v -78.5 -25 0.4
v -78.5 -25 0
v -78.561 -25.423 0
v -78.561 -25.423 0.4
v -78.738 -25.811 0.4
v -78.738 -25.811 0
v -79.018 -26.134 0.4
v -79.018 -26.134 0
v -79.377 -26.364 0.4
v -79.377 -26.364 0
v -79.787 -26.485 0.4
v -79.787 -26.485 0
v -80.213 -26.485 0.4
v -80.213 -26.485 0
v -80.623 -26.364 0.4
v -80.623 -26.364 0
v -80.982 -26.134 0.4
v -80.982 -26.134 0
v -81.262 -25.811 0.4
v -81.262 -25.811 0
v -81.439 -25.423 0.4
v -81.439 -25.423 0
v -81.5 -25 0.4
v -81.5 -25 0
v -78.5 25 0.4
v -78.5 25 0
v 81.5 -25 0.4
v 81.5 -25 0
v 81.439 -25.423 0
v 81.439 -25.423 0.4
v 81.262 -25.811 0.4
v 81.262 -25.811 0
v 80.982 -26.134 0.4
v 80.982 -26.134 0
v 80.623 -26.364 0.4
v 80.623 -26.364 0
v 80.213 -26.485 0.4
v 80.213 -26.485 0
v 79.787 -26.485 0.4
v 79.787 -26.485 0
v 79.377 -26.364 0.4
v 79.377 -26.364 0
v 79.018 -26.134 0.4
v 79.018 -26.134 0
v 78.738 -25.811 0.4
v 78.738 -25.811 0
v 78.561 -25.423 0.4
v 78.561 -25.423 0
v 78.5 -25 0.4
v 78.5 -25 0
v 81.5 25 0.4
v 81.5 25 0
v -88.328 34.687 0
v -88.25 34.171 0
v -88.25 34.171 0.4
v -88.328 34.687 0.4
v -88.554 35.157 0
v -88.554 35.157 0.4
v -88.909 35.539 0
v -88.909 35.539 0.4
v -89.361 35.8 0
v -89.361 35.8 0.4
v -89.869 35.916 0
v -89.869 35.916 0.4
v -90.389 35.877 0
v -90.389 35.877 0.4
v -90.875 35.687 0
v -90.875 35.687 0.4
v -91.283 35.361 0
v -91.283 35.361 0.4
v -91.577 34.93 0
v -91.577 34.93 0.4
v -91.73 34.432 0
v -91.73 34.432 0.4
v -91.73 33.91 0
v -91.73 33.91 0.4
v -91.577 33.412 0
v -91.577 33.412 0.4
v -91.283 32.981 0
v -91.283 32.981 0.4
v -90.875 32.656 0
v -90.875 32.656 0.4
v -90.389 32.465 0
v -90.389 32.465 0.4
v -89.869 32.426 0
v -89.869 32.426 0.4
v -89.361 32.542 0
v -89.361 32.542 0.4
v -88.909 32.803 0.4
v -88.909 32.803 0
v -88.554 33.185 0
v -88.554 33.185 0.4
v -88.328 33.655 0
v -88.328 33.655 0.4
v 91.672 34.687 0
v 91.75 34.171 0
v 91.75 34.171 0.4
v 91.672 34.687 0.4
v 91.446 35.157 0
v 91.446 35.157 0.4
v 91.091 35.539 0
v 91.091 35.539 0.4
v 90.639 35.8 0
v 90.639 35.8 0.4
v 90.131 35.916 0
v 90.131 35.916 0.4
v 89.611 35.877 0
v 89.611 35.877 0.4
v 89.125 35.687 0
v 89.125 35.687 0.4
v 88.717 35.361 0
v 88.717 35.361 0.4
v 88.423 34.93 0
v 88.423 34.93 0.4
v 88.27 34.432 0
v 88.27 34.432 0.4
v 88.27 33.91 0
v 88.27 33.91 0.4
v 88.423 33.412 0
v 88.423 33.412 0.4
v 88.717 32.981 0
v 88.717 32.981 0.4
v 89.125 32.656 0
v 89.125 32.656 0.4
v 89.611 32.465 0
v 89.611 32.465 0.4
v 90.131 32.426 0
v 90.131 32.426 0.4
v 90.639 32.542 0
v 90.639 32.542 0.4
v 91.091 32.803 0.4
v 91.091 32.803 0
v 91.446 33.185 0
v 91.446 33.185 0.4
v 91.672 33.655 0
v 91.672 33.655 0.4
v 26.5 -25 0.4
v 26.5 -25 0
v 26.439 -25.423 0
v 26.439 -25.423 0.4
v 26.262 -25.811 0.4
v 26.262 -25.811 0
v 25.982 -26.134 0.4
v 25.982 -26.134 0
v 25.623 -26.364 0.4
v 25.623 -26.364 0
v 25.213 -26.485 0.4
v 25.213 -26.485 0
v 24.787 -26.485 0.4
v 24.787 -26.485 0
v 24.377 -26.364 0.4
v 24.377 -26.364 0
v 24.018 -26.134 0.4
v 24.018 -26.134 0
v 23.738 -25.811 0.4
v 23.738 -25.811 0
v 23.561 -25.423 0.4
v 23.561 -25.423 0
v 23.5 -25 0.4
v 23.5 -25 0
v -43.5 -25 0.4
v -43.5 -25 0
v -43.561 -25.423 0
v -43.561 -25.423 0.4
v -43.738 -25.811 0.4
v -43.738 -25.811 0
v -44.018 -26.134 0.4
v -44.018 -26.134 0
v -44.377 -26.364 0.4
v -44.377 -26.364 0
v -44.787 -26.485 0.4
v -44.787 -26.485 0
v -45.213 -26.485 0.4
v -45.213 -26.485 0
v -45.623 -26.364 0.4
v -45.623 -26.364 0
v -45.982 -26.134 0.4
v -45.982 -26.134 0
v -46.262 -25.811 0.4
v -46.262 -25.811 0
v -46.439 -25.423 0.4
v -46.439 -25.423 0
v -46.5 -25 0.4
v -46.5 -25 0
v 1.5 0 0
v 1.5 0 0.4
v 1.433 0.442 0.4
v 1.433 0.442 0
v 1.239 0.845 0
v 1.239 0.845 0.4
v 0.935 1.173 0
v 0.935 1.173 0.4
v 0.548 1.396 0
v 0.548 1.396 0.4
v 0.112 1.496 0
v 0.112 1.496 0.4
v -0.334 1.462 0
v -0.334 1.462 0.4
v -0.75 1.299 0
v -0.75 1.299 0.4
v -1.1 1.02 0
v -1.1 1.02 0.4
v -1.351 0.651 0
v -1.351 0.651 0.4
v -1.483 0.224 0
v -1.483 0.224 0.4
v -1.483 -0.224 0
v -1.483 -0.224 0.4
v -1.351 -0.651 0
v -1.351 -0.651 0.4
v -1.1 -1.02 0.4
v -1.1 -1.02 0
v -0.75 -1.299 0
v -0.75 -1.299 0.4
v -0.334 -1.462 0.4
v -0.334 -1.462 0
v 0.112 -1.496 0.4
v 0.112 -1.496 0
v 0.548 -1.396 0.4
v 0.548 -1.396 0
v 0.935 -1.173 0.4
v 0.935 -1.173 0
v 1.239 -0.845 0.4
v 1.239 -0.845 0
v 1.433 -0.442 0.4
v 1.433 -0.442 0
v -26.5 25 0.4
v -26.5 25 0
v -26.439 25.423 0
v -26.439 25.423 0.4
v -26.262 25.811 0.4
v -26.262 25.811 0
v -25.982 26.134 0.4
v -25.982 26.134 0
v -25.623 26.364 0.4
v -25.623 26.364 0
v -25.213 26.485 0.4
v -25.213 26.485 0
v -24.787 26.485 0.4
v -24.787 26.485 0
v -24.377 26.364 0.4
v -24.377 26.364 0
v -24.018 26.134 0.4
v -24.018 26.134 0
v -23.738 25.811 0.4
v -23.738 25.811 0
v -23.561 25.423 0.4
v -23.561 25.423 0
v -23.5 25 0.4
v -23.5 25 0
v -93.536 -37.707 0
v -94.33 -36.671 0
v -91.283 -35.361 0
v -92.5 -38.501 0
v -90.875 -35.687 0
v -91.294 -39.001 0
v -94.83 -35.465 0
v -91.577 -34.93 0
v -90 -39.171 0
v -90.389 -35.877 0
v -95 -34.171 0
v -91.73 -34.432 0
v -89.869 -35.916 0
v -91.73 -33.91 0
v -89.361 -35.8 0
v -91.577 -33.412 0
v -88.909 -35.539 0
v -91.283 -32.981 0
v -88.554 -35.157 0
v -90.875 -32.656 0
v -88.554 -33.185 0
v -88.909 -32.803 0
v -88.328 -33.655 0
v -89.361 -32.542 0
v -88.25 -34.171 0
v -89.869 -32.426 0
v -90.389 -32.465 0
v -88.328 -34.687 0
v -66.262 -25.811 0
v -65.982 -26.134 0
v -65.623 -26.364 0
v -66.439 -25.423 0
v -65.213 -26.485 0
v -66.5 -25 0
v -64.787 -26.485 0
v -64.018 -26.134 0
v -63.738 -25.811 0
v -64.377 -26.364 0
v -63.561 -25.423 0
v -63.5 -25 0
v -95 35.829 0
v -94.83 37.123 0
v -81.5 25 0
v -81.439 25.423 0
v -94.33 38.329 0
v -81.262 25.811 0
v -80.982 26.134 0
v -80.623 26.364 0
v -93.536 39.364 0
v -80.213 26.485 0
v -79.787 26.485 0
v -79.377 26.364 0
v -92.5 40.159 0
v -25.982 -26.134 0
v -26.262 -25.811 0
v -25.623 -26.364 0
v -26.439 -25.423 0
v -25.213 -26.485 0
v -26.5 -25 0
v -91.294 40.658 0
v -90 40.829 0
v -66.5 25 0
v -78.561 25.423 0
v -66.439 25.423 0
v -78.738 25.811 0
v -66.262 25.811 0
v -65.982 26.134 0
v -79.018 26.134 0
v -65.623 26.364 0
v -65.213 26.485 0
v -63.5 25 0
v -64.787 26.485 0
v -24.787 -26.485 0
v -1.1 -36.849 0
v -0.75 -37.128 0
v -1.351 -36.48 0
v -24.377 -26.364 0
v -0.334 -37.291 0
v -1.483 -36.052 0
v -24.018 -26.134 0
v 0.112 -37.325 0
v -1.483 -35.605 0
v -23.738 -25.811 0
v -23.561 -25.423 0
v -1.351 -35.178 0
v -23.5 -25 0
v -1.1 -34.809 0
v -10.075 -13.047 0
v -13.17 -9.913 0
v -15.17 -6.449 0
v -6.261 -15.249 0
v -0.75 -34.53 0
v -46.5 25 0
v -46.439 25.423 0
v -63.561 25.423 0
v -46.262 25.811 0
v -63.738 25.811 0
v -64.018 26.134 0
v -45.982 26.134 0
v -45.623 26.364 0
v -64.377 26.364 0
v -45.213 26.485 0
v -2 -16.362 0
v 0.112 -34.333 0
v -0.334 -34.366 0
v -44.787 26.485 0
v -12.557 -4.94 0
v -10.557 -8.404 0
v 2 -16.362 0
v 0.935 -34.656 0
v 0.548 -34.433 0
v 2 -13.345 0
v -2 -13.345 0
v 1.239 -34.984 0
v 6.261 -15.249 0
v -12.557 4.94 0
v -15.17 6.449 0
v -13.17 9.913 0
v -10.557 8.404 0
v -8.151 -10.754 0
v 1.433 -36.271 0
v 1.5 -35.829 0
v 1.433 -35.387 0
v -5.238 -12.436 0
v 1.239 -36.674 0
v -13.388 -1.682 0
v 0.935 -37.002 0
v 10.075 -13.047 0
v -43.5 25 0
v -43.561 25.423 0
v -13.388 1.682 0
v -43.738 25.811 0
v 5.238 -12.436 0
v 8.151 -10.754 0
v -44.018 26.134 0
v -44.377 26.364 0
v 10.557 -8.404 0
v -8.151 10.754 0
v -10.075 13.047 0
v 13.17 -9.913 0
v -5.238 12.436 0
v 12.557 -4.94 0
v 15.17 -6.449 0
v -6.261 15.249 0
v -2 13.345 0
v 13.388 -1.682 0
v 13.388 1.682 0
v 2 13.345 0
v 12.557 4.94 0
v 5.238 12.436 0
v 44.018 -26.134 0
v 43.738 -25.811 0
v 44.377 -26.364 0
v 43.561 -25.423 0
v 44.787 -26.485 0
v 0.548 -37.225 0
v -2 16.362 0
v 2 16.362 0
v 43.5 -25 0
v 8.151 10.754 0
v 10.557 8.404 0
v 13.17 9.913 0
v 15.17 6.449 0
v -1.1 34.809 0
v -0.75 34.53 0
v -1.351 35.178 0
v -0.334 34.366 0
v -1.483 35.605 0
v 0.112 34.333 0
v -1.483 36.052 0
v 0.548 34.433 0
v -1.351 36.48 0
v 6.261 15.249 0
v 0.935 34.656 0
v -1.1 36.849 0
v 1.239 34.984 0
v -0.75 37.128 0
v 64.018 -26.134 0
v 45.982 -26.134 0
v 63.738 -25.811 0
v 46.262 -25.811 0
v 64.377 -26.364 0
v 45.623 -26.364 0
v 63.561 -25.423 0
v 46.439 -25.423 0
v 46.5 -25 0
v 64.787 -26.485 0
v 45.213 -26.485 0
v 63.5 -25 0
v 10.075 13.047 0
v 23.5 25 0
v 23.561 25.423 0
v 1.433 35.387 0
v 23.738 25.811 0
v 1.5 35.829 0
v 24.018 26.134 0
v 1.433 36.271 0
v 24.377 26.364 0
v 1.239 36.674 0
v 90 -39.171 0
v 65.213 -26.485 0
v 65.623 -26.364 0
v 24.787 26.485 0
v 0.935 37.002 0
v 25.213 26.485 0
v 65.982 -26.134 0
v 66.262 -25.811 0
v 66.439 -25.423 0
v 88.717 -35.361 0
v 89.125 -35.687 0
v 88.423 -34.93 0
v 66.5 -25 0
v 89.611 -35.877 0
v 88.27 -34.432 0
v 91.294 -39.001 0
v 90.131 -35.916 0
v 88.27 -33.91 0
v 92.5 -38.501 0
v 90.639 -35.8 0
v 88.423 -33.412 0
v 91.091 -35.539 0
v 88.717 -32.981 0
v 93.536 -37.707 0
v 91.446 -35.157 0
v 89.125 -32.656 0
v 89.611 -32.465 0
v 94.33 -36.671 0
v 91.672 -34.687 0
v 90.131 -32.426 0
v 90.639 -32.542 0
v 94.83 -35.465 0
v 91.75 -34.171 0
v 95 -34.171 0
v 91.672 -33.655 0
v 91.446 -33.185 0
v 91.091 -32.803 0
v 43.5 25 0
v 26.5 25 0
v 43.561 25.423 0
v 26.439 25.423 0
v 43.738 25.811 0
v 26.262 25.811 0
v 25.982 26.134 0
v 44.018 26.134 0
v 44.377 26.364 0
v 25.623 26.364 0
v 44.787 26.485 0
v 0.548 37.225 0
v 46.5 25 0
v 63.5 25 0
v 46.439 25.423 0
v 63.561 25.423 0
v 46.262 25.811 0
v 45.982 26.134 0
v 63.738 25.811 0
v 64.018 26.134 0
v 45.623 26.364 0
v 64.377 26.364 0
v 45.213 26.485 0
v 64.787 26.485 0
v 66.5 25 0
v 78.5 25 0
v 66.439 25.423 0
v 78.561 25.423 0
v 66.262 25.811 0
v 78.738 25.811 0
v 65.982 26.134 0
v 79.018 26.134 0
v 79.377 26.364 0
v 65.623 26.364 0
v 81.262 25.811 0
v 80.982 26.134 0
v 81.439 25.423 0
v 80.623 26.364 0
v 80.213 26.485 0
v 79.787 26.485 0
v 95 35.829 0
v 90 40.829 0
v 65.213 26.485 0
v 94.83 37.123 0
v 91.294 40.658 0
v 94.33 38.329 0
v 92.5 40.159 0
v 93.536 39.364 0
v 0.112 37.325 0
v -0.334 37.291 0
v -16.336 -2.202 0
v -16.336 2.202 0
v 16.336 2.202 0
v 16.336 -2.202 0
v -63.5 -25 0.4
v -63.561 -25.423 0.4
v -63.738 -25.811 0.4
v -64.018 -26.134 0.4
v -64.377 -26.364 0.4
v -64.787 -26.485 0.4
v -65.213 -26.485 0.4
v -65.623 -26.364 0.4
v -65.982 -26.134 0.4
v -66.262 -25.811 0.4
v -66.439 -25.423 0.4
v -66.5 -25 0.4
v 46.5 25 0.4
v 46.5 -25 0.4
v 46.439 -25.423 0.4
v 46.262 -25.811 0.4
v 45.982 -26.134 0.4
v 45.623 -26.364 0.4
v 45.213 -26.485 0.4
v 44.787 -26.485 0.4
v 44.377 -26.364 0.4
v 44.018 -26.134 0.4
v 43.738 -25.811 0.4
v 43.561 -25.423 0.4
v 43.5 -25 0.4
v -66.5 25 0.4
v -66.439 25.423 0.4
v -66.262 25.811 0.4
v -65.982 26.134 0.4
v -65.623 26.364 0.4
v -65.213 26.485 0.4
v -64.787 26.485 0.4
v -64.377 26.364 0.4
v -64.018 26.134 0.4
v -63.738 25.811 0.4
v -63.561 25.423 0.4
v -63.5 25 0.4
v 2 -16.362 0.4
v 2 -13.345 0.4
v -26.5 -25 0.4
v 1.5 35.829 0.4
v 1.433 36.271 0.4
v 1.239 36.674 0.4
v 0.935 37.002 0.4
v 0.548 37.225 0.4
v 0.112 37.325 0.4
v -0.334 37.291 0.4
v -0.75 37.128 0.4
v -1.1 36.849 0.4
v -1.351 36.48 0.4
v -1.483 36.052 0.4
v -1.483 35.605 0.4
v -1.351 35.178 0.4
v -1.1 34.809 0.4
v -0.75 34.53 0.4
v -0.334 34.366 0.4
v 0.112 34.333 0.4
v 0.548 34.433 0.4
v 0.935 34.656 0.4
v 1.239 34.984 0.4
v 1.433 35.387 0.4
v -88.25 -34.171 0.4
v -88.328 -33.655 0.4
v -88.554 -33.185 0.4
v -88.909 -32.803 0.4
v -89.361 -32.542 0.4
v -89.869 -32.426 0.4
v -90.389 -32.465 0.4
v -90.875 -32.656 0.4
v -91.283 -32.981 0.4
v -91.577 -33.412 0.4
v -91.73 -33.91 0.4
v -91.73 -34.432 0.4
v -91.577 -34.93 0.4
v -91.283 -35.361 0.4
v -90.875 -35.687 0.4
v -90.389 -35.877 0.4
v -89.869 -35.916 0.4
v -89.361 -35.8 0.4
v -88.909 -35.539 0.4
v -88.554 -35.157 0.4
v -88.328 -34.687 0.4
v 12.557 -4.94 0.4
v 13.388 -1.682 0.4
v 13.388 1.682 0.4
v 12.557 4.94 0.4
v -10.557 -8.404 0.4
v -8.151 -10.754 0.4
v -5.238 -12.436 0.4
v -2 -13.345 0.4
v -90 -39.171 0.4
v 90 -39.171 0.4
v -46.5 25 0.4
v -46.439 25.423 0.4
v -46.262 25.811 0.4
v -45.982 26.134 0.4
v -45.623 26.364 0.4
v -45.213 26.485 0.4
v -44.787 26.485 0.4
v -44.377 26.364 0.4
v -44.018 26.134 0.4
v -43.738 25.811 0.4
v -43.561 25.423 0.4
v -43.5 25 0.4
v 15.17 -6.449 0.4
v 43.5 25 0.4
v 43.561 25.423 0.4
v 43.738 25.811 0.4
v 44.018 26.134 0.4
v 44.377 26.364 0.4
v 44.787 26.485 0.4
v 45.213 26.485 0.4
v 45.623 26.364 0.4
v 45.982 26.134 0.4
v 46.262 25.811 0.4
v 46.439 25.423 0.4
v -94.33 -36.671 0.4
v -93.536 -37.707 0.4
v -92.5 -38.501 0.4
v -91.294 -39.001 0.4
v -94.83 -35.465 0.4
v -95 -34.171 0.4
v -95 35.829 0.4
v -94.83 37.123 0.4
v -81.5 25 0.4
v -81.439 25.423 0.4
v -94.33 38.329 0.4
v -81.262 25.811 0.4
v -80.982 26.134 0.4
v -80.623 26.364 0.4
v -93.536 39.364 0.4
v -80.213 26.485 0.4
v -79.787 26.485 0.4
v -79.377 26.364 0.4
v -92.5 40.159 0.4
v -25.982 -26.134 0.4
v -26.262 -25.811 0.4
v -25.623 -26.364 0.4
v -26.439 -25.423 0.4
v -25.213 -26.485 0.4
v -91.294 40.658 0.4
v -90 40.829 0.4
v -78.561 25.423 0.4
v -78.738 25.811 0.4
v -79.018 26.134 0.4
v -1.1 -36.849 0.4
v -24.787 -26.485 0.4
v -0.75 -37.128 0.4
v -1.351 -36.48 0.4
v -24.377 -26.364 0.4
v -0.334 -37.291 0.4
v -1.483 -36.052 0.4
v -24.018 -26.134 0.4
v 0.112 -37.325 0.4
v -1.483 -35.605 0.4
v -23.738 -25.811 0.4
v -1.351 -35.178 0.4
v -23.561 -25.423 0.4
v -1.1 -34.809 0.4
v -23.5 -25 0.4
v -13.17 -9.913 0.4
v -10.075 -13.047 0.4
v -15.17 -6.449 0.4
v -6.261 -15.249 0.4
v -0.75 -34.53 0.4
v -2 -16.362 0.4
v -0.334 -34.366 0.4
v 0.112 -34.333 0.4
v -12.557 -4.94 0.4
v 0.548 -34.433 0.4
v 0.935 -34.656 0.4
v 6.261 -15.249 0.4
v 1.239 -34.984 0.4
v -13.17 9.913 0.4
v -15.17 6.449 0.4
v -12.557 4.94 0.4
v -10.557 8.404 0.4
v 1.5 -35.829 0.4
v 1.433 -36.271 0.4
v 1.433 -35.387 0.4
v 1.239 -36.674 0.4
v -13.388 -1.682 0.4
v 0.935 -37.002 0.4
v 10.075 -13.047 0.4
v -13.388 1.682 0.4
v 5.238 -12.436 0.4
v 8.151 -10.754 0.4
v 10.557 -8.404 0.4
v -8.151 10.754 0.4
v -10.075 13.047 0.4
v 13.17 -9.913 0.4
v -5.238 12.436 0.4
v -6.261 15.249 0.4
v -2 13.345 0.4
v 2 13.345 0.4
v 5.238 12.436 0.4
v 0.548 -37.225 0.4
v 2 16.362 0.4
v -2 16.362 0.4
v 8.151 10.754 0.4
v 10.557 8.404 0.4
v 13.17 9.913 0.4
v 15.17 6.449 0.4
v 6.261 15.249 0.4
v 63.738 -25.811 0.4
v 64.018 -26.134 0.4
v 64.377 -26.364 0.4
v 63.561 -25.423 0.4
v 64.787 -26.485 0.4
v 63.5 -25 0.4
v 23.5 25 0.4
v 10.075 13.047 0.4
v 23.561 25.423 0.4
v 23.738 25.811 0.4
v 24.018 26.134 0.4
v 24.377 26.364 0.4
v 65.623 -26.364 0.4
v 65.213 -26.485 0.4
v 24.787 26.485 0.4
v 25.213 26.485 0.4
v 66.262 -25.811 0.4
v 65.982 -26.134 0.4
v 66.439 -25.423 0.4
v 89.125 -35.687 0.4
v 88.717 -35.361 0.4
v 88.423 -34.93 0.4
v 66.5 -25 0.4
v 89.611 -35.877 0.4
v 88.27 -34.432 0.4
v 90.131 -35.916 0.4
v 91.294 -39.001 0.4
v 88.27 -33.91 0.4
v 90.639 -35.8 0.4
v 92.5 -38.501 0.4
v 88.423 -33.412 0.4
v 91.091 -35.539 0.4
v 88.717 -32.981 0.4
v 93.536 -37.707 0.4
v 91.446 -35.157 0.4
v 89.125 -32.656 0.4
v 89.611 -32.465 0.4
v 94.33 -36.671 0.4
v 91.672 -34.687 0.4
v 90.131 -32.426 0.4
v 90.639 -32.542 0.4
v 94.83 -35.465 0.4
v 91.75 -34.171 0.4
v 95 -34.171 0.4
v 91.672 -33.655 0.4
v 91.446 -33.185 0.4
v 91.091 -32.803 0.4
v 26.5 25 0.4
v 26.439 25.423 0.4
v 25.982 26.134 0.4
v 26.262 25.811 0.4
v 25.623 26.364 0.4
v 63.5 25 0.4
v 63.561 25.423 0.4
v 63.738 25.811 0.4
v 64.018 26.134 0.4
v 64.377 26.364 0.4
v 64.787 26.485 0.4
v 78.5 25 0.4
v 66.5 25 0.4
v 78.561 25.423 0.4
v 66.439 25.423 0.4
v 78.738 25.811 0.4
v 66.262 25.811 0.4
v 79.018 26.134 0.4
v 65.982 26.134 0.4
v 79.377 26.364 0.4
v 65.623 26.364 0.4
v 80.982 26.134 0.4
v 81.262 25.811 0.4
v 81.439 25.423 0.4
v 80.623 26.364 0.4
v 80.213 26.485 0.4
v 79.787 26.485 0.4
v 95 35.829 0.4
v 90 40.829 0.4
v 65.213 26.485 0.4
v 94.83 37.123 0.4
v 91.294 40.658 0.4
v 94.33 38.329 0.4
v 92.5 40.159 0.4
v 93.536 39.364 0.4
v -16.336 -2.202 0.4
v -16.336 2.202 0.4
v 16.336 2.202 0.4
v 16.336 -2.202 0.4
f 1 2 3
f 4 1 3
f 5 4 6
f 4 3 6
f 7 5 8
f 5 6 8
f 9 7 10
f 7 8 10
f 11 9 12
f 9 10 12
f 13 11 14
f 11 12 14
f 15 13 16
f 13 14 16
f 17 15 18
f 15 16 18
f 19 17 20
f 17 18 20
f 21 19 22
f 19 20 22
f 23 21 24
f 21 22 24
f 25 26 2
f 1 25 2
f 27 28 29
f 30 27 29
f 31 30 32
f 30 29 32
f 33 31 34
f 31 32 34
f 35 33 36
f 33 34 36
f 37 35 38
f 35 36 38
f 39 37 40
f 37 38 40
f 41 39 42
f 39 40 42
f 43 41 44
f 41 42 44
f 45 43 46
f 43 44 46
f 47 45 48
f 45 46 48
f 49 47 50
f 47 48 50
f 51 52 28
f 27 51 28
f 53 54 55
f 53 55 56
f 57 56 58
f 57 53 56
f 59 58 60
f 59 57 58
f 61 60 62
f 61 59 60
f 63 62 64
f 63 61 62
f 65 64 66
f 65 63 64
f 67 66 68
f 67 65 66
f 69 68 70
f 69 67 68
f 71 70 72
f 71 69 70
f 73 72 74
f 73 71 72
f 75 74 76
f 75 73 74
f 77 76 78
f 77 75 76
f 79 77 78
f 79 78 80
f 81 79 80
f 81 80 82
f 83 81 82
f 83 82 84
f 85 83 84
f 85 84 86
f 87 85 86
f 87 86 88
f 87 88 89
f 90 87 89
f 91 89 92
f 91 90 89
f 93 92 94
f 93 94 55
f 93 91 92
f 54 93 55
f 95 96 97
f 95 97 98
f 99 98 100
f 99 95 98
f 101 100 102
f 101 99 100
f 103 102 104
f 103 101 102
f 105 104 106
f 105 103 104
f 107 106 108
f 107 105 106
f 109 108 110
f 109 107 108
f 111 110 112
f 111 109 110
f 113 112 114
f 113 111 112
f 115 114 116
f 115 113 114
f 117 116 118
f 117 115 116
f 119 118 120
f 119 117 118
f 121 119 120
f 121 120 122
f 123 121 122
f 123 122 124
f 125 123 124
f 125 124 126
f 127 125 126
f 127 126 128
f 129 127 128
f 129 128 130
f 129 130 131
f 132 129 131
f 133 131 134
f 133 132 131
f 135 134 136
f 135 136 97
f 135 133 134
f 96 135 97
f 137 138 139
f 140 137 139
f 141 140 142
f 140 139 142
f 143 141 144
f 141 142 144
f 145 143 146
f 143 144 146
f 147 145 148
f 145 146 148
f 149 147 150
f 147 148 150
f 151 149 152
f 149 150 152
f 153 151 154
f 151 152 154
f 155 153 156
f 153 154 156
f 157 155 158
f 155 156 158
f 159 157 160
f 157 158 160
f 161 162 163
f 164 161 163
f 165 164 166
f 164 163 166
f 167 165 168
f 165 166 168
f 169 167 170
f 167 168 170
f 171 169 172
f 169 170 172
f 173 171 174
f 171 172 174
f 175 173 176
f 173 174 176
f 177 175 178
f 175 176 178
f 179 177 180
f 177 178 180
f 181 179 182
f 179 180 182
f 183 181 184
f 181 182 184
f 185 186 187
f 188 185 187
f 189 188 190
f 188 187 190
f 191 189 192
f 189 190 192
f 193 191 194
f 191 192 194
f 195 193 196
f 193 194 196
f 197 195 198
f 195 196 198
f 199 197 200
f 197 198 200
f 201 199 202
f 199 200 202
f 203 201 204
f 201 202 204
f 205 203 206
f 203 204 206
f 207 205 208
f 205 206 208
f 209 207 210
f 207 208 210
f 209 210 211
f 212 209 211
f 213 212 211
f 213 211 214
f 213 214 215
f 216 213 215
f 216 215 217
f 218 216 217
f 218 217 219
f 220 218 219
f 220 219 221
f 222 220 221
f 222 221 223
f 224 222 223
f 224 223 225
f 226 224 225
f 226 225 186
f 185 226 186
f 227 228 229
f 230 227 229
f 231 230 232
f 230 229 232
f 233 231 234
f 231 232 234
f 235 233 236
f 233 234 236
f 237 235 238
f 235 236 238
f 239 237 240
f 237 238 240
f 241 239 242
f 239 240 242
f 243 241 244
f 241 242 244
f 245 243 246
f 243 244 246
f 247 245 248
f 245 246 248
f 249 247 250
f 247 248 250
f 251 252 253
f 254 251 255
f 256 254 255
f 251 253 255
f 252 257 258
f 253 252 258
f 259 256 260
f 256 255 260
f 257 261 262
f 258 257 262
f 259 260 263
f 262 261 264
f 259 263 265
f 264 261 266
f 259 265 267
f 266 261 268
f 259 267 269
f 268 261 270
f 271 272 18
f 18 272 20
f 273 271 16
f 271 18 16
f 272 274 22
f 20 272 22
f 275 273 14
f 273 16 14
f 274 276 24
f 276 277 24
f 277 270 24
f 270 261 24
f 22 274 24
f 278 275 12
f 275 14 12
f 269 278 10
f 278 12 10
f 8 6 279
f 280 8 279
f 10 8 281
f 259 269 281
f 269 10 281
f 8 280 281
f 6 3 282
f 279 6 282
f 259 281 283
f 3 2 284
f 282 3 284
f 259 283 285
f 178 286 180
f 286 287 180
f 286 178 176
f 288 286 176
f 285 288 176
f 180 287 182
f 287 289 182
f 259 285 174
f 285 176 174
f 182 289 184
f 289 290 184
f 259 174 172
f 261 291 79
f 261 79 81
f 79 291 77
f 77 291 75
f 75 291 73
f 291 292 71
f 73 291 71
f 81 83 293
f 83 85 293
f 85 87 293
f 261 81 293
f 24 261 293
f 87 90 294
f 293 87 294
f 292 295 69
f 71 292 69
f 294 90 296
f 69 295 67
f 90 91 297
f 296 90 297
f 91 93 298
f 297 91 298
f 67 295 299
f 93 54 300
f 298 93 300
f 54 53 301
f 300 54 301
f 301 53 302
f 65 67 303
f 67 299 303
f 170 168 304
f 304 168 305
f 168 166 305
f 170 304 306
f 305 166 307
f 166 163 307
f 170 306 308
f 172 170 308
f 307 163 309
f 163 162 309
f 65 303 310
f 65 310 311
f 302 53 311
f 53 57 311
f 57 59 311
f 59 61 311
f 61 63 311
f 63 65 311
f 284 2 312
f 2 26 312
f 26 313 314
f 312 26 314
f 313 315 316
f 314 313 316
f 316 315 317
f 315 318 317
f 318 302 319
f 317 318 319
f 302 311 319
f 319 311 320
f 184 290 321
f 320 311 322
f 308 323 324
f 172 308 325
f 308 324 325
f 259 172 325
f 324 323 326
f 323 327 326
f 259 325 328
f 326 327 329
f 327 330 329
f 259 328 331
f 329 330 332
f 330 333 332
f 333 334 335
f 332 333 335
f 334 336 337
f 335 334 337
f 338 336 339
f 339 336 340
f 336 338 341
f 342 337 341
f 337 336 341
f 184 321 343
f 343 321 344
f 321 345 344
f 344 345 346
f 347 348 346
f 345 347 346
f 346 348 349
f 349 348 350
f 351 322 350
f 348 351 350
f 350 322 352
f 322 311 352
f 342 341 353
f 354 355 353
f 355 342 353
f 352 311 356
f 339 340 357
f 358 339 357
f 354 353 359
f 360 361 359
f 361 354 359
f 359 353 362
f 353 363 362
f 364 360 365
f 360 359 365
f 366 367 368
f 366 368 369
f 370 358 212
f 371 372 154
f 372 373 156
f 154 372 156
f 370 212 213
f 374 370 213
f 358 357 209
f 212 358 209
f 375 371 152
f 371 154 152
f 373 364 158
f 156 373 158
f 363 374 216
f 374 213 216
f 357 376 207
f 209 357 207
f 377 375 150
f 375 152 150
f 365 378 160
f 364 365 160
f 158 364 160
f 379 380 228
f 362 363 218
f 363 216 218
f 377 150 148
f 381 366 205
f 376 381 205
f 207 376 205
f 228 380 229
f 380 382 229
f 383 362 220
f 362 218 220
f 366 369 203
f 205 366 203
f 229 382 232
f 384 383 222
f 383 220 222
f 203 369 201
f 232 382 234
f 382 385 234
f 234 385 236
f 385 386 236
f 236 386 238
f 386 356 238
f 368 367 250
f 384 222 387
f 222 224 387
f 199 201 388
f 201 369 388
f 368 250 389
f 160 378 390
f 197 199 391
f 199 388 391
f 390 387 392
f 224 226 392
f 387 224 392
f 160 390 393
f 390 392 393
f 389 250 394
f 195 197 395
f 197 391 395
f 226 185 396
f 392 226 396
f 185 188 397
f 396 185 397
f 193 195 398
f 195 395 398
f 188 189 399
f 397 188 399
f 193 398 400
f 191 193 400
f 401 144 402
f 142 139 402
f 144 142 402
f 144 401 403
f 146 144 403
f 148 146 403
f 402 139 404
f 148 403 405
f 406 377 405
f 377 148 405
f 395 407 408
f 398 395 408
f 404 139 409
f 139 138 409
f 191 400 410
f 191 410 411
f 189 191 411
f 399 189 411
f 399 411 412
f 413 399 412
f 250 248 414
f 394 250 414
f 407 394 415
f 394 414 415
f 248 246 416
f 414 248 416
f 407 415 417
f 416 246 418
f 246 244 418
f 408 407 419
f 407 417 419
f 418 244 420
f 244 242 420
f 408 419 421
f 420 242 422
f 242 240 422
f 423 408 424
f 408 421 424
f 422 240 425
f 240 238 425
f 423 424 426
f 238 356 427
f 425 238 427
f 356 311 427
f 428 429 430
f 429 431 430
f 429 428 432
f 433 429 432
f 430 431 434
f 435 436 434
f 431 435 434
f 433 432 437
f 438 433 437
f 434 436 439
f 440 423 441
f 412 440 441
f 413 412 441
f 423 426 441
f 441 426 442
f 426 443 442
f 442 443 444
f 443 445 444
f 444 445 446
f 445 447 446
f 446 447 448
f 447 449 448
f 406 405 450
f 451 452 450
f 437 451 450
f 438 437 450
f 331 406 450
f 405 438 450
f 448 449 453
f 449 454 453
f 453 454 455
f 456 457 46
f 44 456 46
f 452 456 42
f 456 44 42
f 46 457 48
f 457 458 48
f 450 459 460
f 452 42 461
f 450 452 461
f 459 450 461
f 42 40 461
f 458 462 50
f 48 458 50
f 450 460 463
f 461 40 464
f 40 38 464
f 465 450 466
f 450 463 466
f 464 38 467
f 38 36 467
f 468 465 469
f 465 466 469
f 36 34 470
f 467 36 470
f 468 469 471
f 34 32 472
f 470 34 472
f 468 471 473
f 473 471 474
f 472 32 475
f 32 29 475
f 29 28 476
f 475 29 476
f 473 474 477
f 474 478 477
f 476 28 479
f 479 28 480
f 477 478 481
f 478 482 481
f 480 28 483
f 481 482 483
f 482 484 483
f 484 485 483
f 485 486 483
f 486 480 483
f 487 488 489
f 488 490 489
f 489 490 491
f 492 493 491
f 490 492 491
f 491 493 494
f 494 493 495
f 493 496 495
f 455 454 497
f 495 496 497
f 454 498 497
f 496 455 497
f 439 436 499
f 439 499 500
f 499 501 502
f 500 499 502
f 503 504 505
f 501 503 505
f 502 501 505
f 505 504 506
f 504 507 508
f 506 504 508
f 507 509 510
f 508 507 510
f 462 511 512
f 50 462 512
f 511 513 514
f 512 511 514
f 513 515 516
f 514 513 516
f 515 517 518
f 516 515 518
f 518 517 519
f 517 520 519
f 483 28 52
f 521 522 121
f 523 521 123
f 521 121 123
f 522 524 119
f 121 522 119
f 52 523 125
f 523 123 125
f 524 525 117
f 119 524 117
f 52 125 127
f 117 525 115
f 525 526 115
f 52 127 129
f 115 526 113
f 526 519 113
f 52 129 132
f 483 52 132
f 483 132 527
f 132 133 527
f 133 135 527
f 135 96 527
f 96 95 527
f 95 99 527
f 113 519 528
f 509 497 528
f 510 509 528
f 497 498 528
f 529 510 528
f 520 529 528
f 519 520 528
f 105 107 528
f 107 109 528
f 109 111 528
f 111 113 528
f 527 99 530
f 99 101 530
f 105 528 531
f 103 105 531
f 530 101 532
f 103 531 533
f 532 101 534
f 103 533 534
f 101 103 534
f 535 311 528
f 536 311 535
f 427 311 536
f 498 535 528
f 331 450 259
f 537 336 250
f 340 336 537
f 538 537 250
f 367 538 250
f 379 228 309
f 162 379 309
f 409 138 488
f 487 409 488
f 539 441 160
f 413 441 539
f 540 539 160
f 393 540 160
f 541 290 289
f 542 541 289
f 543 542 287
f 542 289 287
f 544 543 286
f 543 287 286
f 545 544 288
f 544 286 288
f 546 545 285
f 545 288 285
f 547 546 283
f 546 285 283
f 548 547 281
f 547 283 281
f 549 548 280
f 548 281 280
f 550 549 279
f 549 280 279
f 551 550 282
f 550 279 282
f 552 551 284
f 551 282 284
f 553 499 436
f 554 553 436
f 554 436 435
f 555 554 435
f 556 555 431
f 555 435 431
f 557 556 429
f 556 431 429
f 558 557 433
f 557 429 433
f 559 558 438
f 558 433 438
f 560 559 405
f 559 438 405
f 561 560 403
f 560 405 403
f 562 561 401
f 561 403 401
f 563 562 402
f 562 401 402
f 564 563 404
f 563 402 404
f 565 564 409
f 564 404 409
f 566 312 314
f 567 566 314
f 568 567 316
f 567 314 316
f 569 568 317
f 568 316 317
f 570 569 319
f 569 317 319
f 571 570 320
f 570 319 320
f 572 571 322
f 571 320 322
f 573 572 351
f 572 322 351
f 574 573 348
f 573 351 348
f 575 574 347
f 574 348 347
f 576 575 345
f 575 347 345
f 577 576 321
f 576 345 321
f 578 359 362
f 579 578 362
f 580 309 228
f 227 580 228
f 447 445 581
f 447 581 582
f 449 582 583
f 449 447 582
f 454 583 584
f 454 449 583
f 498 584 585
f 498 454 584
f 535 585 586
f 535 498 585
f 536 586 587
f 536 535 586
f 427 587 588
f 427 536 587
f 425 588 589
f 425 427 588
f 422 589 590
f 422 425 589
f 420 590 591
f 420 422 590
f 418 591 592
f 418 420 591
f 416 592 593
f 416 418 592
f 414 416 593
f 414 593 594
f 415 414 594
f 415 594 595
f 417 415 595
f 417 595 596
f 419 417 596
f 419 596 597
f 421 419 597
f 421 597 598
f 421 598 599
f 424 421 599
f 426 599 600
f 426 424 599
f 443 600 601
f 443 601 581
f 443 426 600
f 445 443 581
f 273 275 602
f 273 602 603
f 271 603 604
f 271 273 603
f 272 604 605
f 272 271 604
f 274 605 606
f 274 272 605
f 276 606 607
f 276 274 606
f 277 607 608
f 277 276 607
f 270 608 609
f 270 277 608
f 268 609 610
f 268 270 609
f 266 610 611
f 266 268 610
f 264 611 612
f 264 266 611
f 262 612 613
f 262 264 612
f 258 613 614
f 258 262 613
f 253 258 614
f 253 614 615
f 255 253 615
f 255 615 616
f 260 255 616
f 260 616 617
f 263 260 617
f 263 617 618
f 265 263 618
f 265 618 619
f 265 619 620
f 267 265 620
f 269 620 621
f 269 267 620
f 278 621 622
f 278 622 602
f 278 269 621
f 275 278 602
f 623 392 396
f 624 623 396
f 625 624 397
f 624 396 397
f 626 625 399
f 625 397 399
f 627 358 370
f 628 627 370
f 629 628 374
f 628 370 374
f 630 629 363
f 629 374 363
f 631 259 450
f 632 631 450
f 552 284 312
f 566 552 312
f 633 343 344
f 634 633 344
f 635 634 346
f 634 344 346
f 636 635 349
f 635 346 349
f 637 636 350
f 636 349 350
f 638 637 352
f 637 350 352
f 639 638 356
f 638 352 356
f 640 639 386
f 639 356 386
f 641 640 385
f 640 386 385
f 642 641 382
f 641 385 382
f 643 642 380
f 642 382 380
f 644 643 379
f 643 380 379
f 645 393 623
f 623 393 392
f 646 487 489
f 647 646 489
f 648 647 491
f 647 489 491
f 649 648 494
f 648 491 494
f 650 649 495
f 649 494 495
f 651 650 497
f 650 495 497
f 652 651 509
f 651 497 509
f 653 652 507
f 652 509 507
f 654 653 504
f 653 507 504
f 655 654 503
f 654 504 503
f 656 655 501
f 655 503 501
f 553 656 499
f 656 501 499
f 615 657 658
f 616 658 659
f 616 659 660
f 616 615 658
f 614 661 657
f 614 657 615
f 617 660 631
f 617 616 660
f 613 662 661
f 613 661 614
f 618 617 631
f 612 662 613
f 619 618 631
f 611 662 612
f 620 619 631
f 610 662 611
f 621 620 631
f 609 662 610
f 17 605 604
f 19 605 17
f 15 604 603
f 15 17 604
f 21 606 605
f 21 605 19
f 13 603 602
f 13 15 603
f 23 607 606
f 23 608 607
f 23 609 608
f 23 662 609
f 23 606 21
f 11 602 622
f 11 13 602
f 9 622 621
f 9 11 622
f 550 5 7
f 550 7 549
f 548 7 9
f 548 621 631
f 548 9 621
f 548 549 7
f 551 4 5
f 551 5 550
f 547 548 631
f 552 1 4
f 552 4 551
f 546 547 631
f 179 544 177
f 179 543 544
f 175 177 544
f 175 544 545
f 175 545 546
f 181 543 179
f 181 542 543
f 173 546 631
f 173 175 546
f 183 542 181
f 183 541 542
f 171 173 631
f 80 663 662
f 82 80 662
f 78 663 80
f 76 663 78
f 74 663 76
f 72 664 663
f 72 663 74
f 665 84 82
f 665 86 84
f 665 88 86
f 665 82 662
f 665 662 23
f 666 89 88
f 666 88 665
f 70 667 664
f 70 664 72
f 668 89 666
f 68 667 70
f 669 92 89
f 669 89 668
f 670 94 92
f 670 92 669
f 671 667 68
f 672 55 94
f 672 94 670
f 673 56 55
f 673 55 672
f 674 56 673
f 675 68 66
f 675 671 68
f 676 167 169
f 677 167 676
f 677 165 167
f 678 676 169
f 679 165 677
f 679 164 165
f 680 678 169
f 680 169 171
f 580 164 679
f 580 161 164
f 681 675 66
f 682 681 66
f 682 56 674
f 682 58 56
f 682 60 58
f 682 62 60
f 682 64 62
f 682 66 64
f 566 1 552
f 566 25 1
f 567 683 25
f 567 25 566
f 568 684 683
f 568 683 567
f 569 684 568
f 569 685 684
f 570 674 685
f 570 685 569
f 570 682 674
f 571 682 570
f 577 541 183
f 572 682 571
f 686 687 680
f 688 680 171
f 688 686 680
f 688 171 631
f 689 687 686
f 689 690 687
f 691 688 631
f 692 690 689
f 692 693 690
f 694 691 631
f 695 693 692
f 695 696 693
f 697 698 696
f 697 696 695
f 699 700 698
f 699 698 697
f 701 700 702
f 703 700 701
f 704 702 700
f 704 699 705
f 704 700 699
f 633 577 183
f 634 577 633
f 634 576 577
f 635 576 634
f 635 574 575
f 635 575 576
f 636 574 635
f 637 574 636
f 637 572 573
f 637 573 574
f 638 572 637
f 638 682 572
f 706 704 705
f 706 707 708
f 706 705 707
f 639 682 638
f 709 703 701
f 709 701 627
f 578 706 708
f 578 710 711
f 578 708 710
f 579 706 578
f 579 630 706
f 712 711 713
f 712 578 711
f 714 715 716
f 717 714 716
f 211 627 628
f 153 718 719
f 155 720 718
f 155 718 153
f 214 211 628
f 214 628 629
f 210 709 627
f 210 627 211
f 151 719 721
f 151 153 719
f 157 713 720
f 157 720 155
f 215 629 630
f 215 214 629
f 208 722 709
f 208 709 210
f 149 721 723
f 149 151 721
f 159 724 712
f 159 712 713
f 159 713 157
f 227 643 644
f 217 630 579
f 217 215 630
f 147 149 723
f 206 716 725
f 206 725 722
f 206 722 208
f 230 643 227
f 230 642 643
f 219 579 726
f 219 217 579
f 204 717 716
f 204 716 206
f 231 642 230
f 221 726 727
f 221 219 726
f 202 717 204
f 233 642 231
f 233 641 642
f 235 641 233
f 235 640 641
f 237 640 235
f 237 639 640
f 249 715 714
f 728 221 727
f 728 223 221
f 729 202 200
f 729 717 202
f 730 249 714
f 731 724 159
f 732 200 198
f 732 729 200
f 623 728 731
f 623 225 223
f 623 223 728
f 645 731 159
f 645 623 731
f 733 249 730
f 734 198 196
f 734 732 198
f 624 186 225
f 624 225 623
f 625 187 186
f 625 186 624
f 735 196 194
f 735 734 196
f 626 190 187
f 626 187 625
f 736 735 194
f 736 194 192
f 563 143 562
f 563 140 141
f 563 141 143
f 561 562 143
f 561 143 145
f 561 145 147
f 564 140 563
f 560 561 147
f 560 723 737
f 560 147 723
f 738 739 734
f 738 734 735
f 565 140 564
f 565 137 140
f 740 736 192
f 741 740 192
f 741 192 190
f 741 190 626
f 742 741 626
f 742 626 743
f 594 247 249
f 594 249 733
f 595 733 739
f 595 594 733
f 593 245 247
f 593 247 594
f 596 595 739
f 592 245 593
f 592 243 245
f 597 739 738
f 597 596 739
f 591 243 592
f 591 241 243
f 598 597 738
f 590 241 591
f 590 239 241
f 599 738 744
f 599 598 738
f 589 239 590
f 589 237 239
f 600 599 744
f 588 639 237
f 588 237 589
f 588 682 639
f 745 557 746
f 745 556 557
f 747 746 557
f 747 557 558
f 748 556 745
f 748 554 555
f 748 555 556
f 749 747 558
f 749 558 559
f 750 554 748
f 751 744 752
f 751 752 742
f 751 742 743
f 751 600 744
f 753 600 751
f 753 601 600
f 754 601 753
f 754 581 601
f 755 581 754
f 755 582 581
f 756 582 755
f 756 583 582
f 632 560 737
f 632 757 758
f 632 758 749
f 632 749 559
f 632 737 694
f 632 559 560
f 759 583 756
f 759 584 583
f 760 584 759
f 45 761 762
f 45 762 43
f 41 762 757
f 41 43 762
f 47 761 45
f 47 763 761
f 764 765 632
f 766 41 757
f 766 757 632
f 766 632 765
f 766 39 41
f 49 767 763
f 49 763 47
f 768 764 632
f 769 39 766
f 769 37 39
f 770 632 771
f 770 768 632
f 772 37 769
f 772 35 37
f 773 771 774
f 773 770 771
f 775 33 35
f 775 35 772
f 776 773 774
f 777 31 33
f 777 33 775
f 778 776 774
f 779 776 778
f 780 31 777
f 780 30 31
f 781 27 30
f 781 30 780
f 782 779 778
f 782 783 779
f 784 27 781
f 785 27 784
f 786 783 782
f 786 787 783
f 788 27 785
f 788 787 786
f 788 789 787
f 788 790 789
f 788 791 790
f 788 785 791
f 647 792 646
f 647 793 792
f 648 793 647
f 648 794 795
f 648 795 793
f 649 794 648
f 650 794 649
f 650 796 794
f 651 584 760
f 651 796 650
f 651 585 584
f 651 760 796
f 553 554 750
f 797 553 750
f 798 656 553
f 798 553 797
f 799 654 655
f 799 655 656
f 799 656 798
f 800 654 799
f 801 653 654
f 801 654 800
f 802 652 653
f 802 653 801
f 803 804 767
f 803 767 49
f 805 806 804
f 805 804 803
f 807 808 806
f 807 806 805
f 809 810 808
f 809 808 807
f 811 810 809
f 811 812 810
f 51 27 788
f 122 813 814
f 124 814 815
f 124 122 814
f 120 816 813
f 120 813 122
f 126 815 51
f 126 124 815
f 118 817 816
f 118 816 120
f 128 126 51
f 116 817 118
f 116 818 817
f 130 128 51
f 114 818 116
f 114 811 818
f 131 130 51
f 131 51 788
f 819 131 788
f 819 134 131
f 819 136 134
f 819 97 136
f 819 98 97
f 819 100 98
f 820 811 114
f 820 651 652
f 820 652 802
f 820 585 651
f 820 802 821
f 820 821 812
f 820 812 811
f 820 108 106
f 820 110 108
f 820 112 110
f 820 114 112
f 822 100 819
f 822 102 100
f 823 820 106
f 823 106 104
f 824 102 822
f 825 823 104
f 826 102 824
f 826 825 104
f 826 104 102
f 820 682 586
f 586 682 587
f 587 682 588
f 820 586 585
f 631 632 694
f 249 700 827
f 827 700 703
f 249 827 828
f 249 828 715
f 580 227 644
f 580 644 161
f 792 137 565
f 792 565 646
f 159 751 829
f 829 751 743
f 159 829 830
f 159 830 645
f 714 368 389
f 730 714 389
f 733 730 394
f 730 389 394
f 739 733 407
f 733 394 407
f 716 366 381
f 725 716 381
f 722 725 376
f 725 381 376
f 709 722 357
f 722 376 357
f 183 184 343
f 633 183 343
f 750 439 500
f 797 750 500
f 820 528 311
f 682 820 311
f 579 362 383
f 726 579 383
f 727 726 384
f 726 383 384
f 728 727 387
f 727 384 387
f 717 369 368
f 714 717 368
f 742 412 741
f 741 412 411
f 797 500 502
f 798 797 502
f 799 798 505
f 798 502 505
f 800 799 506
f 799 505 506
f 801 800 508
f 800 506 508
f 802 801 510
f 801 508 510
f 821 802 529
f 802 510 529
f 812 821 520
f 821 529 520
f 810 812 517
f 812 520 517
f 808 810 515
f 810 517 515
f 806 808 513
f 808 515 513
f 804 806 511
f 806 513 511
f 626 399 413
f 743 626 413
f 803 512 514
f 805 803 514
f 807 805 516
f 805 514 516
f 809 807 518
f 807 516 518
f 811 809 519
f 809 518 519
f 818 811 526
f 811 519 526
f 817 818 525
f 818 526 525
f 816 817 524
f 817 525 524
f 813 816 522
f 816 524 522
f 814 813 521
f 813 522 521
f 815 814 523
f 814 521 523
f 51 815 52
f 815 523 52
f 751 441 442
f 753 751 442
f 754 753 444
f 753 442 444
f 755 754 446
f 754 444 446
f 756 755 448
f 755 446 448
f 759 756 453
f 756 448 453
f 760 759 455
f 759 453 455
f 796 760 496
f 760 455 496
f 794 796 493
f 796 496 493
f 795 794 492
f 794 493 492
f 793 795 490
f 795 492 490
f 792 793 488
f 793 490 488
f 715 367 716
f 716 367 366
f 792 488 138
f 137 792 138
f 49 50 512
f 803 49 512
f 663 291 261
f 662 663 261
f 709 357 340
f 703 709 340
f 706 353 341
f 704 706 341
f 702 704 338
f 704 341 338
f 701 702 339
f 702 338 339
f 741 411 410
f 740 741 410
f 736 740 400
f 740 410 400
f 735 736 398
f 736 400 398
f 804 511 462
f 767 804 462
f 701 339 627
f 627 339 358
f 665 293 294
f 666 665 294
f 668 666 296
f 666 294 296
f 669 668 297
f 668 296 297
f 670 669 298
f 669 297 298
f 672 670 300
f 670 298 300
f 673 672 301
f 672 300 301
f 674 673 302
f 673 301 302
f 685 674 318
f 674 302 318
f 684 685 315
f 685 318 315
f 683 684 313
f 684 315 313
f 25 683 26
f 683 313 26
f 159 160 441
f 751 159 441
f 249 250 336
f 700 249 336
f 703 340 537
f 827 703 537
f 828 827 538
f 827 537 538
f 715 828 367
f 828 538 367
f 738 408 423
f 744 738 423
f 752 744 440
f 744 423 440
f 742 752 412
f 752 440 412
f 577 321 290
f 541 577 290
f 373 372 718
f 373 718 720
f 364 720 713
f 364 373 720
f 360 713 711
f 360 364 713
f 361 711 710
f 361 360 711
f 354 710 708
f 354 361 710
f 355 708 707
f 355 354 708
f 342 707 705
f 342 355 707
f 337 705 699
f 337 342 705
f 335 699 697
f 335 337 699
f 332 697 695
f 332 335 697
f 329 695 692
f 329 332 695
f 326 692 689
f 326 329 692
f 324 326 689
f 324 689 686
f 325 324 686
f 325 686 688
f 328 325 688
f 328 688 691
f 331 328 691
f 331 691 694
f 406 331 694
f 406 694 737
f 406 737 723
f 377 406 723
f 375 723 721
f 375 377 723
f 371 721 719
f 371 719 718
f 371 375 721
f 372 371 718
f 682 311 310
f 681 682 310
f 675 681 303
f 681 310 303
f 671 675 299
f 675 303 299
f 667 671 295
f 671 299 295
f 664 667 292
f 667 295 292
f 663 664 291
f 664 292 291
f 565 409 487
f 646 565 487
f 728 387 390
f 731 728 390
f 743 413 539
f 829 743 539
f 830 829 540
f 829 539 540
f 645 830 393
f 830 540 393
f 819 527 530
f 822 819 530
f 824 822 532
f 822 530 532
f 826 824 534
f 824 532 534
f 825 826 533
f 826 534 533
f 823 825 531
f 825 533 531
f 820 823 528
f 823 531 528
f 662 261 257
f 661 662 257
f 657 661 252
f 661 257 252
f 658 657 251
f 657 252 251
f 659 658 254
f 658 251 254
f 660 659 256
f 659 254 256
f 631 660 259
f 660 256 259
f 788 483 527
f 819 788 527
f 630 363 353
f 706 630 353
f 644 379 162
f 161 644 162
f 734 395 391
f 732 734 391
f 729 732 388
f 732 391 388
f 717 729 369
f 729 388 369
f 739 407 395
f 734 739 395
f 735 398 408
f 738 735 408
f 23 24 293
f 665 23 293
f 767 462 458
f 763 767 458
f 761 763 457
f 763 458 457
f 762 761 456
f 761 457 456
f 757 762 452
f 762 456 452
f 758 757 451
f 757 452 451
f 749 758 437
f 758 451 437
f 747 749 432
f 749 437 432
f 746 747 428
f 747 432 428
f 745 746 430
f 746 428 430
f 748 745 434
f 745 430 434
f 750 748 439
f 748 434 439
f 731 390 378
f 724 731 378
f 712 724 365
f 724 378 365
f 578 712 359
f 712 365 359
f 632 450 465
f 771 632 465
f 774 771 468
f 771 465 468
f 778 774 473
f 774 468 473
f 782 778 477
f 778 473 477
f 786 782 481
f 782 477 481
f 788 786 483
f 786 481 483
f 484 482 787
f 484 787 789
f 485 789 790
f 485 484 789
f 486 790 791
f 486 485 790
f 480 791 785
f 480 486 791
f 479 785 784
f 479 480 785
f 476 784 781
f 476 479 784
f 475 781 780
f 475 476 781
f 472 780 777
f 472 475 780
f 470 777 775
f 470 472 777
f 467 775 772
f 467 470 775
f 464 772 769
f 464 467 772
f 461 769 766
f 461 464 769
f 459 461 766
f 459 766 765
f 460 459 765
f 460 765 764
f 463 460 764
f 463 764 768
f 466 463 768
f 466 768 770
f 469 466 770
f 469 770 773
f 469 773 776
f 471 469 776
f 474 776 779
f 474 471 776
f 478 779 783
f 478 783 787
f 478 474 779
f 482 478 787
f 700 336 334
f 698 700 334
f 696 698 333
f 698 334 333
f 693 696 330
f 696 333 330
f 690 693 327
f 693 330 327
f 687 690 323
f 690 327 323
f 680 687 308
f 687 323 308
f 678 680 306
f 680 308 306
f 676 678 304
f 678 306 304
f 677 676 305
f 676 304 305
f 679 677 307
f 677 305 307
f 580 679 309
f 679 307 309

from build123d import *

# Parameters (mm, degrees)
SKETCH_1_R          = 1.75
SKETCH_1_R_2        = 1.5
EXTRUDE_1_DEPTH     = 0.4
SKETCH_2_R          = 1.5
CUT_EXTRUDE_1_DEPTH = 10


with BuildPart() as part:
    # 草图1 → 凸台-拉伸1 (new body)
    with BuildSketch(Plane.XY):
        with BuildLine():
            Line((90, 40.82885301), (-90, 40.82885301))
            ThreePointArc((-90, 40.82885301), (-93.535533906, 39.364386916), (-95, 35.82885301))
            Line((-95, 35.82885301), (-95, -34.17114699))
            ThreePointArc((-95, -34.17114699), (-93.535533906, -37.706680896), (-90, -39.17114699))
            Line((-90, -39.17114699), (90, -39.17114699))
            ThreePointArc((90, -39.17114699), (93.535533906, -37.706680896), (95, -34.17114699))
            Line((95, -34.17114699), (95, 35.82885301))
            ThreePointArc((95, 35.82885301), (93.535533906, 39.364386916), (90, 40.82885301))
        make_face()
        with Locations((-90, -34.17114699)):
            Circle(SKETCH_1_R, mode=Mode.SUBTRACT)
        with BuildLine():
            ThreePointArc((-78.5, -25), (-80, -26.5), (-81.5, -25))
            Line((-81.5, -25), (-81.5, 25))
            ThreePointArc((-81.5, 25), (-80, 26.5), (-78.5, 25))
            Line((-78.5, 25), (-78.5, -25))
        make_face(mode=Mode.SUBTRACT)
        with BuildLine():
            ThreePointArc((-63.5, -25), (-65, -26.5), (-66.5, -25))
            Line((-66.5, -25), (-66.5, 25))
            ThreePointArc((-66.5, 25), (-65, 26.5), (-63.5, 25))
            Line((-63.5, 25), (-63.5, -25))
        make_face(mode=Mode.SUBTRACT)
        with BuildLine():
            ThreePointArc((-43.5, -25), (-45, -26.5), (-46.5, -25))
            Line((-46.5, -25), (-46.5, 25))
            ThreePointArc((-46.5, 25), (-45, 26.5), (-43.5, 25))
            Line((-43.5, 25), (-43.5, -25))
        make_face(mode=Mode.SUBTRACT)
        with BuildLine():
            ThreePointArc((-23.5, -25), (-25, -26.5), (-26.5, -25))
            Line((-26.5, -25), (-26.5, 25))
            ThreePointArc((-26.5, 25), (-25, 26.5), (-23.5, 25))
            Line((-23.5, 25), (-23.5, -25))
        make_face(mode=Mode.SUBTRACT)
        with Locations((0, -35.82885301)):
            Circle(SKETCH_1_R_2, mode=Mode.SUBTRACT)
        with Locations((90, -34.17114699)):
            Circle(SKETCH_1_R, mode=Mode.SUBTRACT)
        with BuildLine():
            Line((-2, 16.362465919), (-2, 13.344643459))
            ThreePointArc((-2, 13.344643459), (-6.746842021, 11.685873172), (-10.55680024, 8.404372537))
            Line((-10.55680024, 8.404372537), (-13.170311155, 9.913283767))
            ThreePointArc((-13.170311155, 9.913283767), (-8.242121859, 14.275773822), (-2, 16.362465919))
        make_face(mode=Mode.SUBTRACT)
        with BuildLine():
            ThreePointArc((-12.55680024, 4.940270922), (-13.493684043, 0), (-12.55680024, -4.940270922))
            Line((-12.55680024, -4.940270922), (-15.170311155, -6.449182152))
            ThreePointArc((-15.170311155, -6.449182152), (-16.484243718, 0), (-15.170311155, 6.449182152))
            Line((-15.170311155, 6.449182152), (-12.55680024, 4.940270922))
        make_face(mode=Mode.SUBTRACT)
        with BuildLine():
            ThreePointArc((-10.55680024, -8.404372537), (-6.746842021, -11.685873172), (-2, -13.344643459))
            Line((-2, -13.344643459), (-2, -16.362465919))
            ThreePointArc((-2, -16.362465919), (-8.242121859, -14.275773822), (-13.170311155, -9.913283767))
            Line((-13.170311155, -9.913283767), (-10.55680024, -8.404372537))
        make_face(mode=Mode.SUBTRACT)
        with BuildLine():
            ThreePointArc((2, -13.344643459), (6.746842021, -11.685873172), (10.55680024, -8.404372537))
            Line((10.55680024, -8.404372537), (13.170311155, -9.913283767))
            ThreePointArc((13.170311155, -9.913283767), (8.242121859, -14.275773822), (2, -16.362465919))
            Line((2, -16.362465919), (2, -13.344643459))
        make_face(mode=Mode.SUBTRACT)
        with BuildLine():
            ThreePointArc((12.55680024, -4.940270922), (13.493684043, 0), (12.55680024, 4.940270922))
            Line((12.55680024, 4.940270922), (15.170311155, 6.449182152))
            ThreePointArc((15.170311155, 6.449182152), (16.484243718, 0), (15.170311155, -6.449182152))
            Line((15.170311155, -6.449182152), (12.55680024, -4.940270922))
        make_face(mode=Mode.SUBTRACT)
        with BuildLine():
            ThreePointArc((10.55680024, 8.404372537), (6.746842021, 11.685873172), (2, 13.344643459))
            Line((2, 13.344643459), (2, 16.362465919))
            ThreePointArc((2, 16.362465919), (8.242121859, 14.275773822), (13.170311155, 9.913283767))
            Line((13.170311155, 9.913283767), (10.55680024, 8.404372537))
        make_face(mode=Mode.SUBTRACT)
        with BuildLine():
            ThreePointArc((26.5, -25), (25, -26.5), (23.5, -25))
            Line((23.5, -25), (23.5, 25))
            ThreePointArc((23.5, 25), (25, 26.5), (26.5, 25))
            Line((26.5, 25), (26.5, -25))
        make_face(mode=Mode.SUBTRACT)
        with BuildLine():
            ThreePointArc((46.5, -25), (45, -26.5), (43.5, -25))
            Line((43.5, -25), (43.5, 25))
            ThreePointArc((43.5, 25), (45, 26.5), (46.5, 25))
            Line((46.5, 25), (46.5, -25))
        make_face(mode=Mode.SUBTRACT)
        with BuildLine():
            ThreePointArc((66.5, -25), (65, -26.5), (63.5, -25))
            Line((63.5, -25), (63.5, 25))
            ThreePointArc((63.5, 25), (65, 26.5), (66.5, 25))
            Line((66.5, 25), (66.5, -25))
        make_face(mode=Mode.SUBTRACT)
        with BuildLine():
            Line((81.5, 25), (81.5, -25))
            ThreePointArc((81.5, -25), (80, -26.5), (78.5, -25))
            Line((78.5, -25), (78.5, 25))
            ThreePointArc((78.5, 25), (80, 26.5), (81.5, 25))
        make_face(mode=Mode.SUBTRACT)
        with Locations((-90, 34.17114699)):
            Circle(SKETCH_1_R, mode=Mode.SUBTRACT)
        with Locations((0, 35.82885301)):
            Circle(SKETCH_1_R_2, mode=Mode.SUBTRACT)
        with Locations((90, 34.17114699)):
            Circle(SKETCH_1_R, mode=Mode.SUBTRACT)
    extrude(amount=EXTRUDE_1_DEPTH)

    # 草图2 → 切除-拉伸1 (cut)
    with BuildSketch(Plane.XY.offset(0.4)):
        Circle(SKETCH_2_R)
    extrude(amount=-CUT_EXTRUDE_1_DEPTH, mode=Mode.SUBTRACT)


solid = part.part
